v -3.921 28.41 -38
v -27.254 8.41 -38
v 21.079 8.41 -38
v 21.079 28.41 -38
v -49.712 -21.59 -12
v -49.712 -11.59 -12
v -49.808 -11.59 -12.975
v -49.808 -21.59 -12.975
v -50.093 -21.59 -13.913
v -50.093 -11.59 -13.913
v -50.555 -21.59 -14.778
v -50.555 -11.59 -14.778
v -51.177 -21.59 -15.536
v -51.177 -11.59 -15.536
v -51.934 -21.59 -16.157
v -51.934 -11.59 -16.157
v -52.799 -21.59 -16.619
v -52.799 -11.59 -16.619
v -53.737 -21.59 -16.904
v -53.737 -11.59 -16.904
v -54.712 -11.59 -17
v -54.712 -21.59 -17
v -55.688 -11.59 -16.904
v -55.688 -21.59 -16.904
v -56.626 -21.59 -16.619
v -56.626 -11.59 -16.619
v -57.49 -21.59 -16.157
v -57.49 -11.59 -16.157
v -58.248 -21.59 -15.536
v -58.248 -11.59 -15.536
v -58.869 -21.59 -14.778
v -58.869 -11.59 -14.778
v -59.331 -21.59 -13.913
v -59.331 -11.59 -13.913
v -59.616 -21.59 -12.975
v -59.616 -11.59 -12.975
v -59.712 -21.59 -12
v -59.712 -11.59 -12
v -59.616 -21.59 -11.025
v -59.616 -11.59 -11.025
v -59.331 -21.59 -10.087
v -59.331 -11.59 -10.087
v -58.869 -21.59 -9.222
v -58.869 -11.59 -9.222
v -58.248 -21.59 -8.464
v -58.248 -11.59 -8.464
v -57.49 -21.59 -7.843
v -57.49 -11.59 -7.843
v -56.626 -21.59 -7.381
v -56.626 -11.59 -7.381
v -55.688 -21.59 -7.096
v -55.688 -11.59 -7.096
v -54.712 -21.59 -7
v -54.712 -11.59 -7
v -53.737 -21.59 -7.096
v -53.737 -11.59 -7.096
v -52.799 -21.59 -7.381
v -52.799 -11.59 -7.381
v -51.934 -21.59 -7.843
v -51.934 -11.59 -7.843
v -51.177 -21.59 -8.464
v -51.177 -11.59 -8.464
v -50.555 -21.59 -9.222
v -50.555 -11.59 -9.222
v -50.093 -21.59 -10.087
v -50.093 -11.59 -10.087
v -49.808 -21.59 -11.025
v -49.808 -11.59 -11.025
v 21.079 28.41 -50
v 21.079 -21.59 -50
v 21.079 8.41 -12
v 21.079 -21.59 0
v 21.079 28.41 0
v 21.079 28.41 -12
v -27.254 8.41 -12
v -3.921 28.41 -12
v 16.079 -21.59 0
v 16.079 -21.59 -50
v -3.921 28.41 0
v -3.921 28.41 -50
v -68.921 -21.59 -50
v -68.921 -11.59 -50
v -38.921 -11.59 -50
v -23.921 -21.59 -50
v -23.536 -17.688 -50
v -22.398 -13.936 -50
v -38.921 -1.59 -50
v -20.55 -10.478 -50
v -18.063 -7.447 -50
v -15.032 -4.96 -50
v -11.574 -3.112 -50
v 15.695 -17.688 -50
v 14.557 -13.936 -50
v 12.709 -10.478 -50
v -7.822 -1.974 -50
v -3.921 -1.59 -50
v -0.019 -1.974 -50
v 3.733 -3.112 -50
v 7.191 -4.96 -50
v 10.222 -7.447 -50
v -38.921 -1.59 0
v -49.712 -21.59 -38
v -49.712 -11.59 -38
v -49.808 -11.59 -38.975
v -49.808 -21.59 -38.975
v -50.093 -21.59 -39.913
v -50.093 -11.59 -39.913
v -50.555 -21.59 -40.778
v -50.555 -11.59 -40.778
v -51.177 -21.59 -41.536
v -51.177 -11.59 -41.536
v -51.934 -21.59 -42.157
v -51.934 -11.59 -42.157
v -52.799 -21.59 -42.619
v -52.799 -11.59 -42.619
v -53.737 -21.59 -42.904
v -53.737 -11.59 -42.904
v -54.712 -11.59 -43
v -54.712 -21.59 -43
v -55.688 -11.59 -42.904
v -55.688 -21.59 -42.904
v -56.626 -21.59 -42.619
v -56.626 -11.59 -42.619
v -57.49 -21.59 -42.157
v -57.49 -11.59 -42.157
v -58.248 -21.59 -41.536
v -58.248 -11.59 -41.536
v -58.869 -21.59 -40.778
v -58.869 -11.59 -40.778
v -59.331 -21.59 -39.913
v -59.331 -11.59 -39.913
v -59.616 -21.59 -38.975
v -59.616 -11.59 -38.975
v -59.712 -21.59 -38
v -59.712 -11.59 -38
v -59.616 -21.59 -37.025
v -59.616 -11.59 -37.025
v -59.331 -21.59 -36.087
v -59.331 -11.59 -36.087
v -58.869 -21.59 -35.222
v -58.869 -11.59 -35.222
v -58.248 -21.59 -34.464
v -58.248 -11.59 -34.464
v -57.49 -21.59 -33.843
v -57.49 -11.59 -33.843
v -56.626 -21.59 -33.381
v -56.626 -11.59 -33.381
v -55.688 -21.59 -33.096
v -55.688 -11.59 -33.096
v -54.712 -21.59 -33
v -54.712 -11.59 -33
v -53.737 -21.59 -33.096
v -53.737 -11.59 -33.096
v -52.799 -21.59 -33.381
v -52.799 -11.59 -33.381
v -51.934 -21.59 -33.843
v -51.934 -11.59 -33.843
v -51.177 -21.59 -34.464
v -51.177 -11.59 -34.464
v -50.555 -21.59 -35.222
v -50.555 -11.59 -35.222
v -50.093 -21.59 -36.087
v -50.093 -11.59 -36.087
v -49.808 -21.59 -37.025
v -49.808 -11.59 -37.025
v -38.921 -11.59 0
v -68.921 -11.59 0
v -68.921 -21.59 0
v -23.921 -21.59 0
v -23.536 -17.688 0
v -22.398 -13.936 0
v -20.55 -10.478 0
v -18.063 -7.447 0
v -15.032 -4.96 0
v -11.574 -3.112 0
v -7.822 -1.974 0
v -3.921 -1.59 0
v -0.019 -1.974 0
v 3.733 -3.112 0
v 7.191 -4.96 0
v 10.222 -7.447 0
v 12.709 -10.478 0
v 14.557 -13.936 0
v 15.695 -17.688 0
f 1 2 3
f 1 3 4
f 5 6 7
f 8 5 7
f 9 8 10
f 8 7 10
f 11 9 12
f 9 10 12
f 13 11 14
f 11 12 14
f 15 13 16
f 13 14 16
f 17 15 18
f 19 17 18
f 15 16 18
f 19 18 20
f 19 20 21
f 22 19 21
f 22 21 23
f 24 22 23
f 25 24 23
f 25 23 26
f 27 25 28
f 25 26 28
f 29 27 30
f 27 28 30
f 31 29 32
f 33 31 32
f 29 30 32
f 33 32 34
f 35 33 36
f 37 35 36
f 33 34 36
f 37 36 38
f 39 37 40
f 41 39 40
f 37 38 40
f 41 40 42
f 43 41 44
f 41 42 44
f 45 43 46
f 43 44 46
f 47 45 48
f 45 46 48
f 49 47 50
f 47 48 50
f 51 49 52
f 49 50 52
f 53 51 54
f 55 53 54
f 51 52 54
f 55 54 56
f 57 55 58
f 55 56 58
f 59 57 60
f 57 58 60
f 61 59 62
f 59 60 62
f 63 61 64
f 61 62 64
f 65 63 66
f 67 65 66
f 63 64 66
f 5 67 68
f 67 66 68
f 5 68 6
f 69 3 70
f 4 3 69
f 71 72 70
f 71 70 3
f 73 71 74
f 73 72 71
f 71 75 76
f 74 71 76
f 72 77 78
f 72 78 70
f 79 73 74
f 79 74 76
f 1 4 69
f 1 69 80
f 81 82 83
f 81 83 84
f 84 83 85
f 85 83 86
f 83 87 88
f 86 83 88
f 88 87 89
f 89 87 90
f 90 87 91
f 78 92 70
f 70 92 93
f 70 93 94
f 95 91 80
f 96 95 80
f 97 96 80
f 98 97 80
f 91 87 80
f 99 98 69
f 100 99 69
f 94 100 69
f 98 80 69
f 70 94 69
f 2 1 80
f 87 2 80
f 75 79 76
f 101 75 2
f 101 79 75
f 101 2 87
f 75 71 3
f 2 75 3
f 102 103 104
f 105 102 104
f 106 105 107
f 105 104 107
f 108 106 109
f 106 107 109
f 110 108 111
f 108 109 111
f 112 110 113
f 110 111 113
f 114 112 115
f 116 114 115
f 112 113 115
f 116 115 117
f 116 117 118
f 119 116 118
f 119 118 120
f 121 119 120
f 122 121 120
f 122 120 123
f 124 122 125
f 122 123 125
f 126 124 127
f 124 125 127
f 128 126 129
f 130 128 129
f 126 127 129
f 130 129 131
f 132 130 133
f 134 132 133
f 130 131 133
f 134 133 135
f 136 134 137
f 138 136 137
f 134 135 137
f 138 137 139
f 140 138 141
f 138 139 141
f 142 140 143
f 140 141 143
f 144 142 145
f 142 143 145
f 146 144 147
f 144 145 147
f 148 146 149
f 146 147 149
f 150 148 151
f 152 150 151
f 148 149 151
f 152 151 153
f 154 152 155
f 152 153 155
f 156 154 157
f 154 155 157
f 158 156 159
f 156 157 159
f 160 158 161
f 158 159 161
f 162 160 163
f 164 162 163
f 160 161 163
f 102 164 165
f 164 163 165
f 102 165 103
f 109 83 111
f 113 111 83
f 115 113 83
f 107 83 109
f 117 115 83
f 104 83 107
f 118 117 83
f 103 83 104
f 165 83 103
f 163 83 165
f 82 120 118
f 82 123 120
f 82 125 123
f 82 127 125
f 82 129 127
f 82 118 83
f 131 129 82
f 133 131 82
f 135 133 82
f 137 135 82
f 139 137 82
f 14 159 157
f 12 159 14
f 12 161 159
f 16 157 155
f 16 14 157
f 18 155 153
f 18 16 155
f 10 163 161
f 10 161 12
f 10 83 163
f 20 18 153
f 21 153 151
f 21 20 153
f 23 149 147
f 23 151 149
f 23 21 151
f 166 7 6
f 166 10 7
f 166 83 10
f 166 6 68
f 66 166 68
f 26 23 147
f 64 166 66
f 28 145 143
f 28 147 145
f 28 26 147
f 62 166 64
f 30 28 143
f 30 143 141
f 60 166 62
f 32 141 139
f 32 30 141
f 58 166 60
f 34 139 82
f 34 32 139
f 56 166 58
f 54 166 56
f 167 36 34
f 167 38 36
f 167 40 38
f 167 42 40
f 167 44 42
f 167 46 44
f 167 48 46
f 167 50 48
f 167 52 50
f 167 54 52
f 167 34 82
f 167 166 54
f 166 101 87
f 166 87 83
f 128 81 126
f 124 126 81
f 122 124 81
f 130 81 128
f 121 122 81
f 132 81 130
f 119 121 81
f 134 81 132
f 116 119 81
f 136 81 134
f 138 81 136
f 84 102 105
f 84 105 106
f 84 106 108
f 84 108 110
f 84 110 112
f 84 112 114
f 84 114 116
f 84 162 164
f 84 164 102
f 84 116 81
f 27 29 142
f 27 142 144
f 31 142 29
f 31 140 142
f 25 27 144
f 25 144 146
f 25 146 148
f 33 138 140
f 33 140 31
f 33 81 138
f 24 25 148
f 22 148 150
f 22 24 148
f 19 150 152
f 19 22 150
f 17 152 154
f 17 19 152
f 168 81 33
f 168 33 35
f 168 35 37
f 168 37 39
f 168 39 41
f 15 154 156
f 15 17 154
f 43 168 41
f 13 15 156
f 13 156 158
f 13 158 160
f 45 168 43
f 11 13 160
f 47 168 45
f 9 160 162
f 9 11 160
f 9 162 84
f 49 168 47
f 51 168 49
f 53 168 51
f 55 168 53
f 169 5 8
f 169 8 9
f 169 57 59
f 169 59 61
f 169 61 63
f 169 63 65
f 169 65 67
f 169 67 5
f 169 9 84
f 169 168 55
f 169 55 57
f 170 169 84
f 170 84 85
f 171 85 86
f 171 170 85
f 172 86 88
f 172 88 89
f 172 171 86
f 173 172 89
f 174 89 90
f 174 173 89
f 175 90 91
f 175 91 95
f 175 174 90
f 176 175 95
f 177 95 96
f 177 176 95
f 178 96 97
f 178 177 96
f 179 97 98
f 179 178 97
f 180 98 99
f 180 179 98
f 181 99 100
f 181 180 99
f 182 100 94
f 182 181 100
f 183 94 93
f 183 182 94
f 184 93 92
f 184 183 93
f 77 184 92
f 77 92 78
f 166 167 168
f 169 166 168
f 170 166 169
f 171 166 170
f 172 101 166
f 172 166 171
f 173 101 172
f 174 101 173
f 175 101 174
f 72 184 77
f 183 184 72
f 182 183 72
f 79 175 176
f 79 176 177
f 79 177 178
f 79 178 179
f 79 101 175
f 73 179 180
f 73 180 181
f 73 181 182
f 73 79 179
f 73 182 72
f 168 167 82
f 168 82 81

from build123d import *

# Parameters (mm, degrees)
SALIENTE_EXTRUIR2_DEPTH = 50
CROQUIS3_R              = 5
CORTAR_EXTRUIR3_DEPTH   = 10
CROQUIS5_W              = 26
CROQUIS5_H              = 20
CORTAR_EXTRUIR4_DEPTH   = 100


with BuildPart() as part:
    # Croquis1 → Saliente-Extruir2 (new body)
    with BuildSketch(Plane.XY):
        with BuildLine():
            Line((-68.920564692, -21.589574482), (-23.920564692, -21.589574482))
            ThreePointArc((-23.920564692, -21.589574482), (-3.920564692, -1.589574482), (16.079435308, -21.589574482))
            Line((16.079435308, -21.589574482), (21.079435308, -21.589574482))
            Line((21.079435308, -21.589574482), (21.079435308, 28.410425518))
            Line((21.079435308, 28.410425518), (-3.920564692, 28.410425518))
            Line((-3.920564692, 28.410425518), (-38.920564692, -1.589574482))
            Line((-38.920564692, -1.589574482), (-38.920564692, -11.589574482))
            Line((-38.920564692, -11.589574482), (-68.920564692, -11.589574482))
            Line((-68.920564692, -11.589574482), (-68.920564692, -21.589574482))
        make_face()
    extrude(amount=-SALIENTE_EXTRUIR2_DEPTH)

    # Croquis3 → Cortar-Extruir3 (cut)
    with BuildSketch(Plane(origin=(0, -11.589574482, 0), x_dir=(1, 0, 0), z_dir=(0, 1, 0))):
        with Locations((-54.712100966, 38)):
            Circle(CROQUIS3_R)
        with Locations((-54.712100966, 12)):
            Circle(CROQUIS3_R)
    extrude(amount=-CORTAR_EXTRUIR3_DEPTH, mode=Mode.SUBTRACT)

    # Croquis5 → Cortar-Extruir4 (cut)
    with BuildSketch(Plane(origin=(21.079435308, 0, 0), x_dir=(0, 0, -1), z_dir=(1, 0, 0))):
        with Locations((25, 18.410425518)):
            Rectangle(CROQUIS5_W, CROQUIS5_H)
    extrude(amount=-CORTAR_EXTRUIR4_DEPTH, mode=Mode.SUBTRACT)


solid = part.part
